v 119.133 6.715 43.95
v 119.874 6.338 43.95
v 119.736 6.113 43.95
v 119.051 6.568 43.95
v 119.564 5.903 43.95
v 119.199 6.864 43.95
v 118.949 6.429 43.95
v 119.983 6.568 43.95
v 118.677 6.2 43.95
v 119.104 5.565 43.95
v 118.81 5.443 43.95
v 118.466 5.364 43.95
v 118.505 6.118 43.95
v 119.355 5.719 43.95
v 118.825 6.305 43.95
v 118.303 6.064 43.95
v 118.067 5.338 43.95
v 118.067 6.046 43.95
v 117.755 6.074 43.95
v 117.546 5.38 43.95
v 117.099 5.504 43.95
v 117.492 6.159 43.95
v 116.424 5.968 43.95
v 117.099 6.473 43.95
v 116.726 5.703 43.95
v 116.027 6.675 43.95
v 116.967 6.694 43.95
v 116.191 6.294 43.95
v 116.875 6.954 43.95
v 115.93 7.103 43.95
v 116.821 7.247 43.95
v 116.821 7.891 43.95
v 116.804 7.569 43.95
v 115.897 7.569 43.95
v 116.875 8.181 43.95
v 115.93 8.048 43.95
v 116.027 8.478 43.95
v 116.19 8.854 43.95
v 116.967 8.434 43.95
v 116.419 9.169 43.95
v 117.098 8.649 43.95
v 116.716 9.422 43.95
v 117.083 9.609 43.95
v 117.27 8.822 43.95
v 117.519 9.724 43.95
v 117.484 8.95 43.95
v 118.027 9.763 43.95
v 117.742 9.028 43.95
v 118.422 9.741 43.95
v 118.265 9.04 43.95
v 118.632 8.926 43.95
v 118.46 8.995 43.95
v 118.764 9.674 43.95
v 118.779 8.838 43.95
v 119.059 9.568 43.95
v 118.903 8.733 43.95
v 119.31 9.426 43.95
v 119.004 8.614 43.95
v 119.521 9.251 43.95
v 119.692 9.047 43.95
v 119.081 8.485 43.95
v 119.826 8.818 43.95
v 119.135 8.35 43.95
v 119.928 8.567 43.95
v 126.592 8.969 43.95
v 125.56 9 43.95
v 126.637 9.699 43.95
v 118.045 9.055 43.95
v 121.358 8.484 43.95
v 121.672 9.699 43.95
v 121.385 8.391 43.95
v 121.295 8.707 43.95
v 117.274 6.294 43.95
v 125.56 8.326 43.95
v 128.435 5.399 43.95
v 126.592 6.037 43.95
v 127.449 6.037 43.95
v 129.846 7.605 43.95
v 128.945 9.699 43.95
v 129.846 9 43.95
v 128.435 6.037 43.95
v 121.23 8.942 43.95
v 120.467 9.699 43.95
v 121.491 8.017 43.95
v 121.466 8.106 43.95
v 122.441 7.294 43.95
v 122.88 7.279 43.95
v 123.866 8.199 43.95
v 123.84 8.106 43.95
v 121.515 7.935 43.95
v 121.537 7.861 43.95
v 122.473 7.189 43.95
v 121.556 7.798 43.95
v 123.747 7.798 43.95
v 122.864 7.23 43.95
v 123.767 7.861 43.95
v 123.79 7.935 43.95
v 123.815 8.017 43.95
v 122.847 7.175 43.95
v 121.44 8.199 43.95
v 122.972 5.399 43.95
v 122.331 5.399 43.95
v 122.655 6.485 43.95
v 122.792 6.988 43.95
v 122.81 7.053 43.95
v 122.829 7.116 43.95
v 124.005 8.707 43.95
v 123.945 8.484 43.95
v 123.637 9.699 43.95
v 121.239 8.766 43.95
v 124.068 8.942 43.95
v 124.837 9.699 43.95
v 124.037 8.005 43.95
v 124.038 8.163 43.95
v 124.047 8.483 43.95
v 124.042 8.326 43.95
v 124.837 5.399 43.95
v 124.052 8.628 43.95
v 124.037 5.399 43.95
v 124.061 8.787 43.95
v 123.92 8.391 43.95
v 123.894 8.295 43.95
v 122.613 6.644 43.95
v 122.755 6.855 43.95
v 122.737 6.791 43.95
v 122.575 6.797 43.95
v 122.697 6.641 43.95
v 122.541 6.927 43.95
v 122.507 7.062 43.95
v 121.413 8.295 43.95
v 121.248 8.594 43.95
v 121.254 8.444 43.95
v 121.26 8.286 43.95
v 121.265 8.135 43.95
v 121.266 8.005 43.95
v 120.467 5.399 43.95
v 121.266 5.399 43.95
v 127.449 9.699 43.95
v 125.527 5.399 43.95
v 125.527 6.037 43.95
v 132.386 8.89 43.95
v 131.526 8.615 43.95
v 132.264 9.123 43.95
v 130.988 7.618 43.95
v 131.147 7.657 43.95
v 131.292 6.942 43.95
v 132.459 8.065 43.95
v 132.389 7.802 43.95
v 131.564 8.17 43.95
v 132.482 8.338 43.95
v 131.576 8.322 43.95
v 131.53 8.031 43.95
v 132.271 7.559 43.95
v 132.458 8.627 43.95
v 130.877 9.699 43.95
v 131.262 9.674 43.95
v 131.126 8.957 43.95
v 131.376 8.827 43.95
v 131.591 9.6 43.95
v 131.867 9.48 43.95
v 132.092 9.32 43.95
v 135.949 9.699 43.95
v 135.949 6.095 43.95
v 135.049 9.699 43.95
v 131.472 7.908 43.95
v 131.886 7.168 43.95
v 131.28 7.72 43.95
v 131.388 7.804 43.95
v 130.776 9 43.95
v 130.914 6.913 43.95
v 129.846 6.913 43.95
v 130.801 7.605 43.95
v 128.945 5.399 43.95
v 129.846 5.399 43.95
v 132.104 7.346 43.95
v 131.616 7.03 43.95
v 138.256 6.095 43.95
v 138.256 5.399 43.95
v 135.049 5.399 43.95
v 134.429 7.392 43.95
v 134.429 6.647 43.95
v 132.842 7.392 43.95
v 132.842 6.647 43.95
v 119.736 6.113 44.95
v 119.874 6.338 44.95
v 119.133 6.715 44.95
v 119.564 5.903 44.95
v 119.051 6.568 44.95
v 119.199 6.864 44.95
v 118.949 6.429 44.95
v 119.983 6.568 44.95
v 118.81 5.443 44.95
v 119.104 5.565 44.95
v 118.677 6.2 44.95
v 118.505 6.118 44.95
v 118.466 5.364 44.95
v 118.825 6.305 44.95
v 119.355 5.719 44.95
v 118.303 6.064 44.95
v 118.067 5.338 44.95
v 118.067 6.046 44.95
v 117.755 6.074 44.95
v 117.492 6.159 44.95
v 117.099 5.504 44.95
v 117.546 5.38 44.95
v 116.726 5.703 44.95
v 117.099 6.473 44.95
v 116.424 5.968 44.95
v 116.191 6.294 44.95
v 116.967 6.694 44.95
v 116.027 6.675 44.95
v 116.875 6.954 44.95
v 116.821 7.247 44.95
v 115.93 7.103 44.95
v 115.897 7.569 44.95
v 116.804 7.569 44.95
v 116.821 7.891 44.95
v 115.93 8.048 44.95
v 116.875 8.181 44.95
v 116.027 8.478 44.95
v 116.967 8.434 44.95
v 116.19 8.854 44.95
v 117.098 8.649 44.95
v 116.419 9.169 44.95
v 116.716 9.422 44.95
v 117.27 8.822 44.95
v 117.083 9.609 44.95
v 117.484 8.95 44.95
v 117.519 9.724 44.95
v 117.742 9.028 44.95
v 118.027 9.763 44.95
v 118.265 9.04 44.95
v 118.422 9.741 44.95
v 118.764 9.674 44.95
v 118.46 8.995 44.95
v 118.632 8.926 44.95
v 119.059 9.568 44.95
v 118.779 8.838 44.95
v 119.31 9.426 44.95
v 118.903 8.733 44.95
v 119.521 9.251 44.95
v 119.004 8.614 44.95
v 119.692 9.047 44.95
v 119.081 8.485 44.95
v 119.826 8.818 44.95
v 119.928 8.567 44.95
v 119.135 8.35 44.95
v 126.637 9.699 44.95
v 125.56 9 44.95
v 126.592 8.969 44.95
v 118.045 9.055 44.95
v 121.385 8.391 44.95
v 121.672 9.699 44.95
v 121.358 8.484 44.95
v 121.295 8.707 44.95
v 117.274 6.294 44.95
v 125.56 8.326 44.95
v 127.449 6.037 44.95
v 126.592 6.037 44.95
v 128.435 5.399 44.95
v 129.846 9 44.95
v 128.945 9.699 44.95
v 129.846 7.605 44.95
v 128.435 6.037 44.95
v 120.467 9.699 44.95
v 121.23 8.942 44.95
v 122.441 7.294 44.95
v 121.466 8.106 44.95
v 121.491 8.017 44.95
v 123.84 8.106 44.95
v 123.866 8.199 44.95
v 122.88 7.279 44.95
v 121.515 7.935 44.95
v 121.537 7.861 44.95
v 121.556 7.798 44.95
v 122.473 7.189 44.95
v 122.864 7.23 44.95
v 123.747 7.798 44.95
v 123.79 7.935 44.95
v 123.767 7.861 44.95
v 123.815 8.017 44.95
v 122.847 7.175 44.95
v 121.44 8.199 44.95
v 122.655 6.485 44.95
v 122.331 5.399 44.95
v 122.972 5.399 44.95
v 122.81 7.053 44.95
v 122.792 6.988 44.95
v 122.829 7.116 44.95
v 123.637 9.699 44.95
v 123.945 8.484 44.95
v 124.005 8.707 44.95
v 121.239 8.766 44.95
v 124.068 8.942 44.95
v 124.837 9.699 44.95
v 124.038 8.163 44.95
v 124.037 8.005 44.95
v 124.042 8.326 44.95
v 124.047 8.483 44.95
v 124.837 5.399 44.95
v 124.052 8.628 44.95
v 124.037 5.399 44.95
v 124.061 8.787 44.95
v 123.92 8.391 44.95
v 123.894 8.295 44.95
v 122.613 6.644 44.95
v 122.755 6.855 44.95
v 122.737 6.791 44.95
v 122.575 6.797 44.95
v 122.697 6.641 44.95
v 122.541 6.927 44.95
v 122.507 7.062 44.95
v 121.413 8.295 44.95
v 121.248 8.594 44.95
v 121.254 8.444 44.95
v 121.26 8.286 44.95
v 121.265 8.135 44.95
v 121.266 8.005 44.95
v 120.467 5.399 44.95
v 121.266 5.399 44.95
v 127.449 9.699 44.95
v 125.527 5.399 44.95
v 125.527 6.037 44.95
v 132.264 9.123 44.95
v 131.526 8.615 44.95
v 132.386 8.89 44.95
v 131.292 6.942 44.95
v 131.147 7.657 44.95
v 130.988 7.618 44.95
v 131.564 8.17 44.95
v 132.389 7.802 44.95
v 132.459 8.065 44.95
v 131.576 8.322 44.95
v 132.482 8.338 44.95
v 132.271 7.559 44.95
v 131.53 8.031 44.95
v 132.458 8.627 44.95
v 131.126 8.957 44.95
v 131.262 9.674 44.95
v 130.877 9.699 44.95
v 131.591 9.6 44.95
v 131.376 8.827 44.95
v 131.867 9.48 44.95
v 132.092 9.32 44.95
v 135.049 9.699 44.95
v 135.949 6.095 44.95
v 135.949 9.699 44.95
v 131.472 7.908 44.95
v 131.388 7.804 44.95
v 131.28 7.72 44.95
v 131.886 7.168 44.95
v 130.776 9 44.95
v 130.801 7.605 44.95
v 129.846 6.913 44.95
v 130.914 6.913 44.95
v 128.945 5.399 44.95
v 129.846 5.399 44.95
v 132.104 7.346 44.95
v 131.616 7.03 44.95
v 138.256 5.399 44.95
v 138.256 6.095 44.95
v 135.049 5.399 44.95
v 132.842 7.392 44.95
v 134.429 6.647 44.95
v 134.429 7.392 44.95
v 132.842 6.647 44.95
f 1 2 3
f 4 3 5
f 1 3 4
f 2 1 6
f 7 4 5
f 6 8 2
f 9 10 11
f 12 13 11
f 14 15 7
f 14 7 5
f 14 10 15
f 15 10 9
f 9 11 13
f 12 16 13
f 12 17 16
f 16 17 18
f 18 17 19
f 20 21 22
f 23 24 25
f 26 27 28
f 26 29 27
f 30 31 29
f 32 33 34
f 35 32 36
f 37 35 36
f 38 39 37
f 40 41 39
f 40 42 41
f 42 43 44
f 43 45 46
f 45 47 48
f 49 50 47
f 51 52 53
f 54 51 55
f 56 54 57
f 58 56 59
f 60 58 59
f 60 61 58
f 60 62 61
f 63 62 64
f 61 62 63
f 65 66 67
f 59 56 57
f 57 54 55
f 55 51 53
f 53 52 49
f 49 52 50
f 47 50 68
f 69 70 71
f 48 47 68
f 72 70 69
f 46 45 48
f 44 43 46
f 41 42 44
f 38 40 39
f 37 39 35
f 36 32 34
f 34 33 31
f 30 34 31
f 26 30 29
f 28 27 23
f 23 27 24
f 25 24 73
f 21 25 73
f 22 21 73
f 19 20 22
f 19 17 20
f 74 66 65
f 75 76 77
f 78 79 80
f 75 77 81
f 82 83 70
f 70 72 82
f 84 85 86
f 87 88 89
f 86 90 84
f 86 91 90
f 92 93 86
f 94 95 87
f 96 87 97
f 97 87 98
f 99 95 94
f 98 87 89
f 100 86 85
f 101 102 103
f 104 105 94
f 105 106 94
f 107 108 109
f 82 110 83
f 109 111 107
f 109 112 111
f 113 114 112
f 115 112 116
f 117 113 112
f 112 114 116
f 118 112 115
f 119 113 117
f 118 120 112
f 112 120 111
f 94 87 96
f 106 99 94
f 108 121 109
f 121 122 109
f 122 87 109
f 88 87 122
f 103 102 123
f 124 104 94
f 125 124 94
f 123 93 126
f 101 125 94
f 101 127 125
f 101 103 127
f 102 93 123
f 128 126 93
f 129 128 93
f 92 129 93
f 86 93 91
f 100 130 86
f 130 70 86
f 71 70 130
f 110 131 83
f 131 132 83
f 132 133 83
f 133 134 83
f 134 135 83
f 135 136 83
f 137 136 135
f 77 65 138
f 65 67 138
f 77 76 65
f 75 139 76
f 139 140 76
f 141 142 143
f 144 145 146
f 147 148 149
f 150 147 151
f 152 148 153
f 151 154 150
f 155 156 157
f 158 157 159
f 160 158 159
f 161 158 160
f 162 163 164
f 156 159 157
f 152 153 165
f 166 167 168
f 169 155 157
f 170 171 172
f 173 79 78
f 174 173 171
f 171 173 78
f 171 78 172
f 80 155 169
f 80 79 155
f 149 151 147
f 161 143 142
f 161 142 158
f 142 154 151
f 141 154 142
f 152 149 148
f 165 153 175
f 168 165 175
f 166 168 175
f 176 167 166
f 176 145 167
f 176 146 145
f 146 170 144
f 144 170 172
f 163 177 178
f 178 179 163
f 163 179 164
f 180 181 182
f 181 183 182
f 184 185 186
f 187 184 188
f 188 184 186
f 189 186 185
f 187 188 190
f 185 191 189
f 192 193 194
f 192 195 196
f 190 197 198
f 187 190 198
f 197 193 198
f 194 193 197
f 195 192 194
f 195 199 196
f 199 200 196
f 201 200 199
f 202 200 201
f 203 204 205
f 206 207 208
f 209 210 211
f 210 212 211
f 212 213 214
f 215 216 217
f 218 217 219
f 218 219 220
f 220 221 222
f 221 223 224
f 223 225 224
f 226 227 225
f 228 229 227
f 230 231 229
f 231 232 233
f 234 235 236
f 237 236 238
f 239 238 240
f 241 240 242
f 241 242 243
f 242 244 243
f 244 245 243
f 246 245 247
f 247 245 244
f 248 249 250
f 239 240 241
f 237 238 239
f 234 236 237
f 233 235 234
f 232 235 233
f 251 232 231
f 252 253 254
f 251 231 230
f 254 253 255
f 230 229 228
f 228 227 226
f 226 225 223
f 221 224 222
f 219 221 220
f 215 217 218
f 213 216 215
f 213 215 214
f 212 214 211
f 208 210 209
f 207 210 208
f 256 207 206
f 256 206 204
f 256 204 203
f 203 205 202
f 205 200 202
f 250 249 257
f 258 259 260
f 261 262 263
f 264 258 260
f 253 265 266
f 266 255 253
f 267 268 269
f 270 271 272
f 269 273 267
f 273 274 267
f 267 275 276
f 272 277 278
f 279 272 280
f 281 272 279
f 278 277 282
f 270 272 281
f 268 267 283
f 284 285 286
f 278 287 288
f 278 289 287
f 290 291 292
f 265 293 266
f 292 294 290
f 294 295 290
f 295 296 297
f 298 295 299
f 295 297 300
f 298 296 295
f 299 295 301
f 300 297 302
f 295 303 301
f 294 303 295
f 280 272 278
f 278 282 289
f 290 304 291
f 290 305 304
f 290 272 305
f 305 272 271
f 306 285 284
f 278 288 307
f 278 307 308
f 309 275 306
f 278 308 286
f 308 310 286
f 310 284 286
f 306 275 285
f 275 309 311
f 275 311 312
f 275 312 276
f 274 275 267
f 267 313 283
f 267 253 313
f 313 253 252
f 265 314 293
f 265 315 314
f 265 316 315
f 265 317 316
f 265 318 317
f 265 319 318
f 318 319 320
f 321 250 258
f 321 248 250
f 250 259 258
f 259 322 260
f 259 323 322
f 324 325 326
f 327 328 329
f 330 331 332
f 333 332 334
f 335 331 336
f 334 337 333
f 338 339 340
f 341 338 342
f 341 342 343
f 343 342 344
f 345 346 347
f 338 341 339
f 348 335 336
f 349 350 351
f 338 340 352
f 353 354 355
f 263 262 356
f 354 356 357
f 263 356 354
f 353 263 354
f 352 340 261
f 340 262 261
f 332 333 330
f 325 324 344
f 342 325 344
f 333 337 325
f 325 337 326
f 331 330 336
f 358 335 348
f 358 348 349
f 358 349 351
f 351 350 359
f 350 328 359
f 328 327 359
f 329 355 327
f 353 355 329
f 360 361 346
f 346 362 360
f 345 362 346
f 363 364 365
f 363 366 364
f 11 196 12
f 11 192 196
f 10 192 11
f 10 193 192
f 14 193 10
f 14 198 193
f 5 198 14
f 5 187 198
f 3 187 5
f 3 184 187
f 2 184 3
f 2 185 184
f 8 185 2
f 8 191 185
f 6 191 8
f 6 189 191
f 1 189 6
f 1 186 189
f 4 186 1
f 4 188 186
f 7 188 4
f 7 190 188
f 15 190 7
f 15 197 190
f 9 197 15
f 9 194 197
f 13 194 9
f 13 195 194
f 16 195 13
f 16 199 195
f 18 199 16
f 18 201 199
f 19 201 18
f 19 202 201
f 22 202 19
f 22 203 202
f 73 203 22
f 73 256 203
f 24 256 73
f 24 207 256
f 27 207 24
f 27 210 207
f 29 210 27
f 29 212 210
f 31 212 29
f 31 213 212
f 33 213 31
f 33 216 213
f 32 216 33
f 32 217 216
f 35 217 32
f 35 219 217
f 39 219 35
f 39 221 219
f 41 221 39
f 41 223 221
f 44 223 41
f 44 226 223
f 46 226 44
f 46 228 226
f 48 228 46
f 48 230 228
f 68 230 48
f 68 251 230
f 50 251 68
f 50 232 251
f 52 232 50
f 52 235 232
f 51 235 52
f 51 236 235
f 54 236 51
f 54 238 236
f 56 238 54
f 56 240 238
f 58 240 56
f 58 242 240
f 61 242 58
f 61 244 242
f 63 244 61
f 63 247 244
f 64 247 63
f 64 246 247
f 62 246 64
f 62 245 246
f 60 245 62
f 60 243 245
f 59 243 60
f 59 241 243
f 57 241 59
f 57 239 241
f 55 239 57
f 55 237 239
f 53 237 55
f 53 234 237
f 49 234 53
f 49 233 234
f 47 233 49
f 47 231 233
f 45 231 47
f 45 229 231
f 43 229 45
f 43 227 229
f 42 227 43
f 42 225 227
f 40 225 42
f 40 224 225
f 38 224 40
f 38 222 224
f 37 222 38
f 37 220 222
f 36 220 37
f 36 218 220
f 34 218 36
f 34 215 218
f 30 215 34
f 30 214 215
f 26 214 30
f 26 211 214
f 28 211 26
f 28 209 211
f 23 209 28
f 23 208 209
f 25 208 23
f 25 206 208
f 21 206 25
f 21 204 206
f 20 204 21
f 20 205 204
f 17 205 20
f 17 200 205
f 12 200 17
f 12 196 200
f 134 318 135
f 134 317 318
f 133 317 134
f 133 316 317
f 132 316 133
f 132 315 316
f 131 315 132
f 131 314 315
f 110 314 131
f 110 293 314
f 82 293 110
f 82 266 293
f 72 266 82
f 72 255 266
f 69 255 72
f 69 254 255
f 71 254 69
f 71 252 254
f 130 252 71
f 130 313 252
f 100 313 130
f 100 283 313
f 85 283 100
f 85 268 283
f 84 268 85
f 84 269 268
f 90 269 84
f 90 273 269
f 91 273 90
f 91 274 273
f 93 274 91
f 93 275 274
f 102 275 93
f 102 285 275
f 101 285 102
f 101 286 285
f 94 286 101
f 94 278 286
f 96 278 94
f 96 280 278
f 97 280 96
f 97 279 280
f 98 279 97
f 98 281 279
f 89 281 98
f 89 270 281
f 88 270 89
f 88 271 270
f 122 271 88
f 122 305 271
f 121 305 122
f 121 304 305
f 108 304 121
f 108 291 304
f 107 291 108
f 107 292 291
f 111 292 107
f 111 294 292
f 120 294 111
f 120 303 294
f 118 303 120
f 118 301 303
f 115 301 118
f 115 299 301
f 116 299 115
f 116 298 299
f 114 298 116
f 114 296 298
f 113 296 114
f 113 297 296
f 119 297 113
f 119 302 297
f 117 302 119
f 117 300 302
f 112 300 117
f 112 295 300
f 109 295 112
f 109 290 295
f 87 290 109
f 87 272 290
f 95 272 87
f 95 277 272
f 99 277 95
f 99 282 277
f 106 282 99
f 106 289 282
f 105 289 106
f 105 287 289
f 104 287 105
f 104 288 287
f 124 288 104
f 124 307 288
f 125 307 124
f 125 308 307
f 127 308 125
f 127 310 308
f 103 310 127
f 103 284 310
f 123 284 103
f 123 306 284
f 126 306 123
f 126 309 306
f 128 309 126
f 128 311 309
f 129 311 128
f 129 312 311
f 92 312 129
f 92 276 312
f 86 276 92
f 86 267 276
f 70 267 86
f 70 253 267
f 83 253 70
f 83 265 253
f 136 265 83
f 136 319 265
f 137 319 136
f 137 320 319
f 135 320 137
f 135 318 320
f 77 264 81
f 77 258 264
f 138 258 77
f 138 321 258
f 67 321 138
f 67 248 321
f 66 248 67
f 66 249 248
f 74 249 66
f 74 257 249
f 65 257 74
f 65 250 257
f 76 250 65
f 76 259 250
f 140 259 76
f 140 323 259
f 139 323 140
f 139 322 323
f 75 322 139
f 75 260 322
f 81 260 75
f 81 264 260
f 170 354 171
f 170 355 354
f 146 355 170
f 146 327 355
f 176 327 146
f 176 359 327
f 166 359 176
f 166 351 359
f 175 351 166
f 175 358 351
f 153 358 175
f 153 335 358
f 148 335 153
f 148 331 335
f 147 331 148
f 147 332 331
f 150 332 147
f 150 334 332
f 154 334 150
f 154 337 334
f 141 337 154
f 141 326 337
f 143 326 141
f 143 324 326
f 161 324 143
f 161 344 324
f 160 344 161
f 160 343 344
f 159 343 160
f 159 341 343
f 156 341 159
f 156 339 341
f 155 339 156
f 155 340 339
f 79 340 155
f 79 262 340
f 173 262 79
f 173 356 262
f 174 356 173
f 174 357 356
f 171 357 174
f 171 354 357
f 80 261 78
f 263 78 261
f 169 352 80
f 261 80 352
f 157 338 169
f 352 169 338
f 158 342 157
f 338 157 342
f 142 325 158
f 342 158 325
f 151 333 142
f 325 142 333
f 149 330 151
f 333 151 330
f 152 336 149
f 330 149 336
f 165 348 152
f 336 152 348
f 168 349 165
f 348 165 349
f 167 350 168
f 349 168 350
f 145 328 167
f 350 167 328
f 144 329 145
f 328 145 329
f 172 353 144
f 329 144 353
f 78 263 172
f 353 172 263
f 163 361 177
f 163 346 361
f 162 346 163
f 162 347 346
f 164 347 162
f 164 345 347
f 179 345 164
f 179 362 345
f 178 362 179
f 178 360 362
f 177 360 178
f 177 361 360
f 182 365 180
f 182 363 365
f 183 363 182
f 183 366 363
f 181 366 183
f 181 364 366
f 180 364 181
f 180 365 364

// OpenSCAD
// CM1P-L ID text, engraved 0.5 into the plate's top face (frame as cm1p_k_freecad.py).
translate([127, 7.5, 43.95]) linear_extrude(1) text("CM1P-L", size = 4.5, font = "Liberation Sans:style=Bold", halign = "center", valign = "center");
